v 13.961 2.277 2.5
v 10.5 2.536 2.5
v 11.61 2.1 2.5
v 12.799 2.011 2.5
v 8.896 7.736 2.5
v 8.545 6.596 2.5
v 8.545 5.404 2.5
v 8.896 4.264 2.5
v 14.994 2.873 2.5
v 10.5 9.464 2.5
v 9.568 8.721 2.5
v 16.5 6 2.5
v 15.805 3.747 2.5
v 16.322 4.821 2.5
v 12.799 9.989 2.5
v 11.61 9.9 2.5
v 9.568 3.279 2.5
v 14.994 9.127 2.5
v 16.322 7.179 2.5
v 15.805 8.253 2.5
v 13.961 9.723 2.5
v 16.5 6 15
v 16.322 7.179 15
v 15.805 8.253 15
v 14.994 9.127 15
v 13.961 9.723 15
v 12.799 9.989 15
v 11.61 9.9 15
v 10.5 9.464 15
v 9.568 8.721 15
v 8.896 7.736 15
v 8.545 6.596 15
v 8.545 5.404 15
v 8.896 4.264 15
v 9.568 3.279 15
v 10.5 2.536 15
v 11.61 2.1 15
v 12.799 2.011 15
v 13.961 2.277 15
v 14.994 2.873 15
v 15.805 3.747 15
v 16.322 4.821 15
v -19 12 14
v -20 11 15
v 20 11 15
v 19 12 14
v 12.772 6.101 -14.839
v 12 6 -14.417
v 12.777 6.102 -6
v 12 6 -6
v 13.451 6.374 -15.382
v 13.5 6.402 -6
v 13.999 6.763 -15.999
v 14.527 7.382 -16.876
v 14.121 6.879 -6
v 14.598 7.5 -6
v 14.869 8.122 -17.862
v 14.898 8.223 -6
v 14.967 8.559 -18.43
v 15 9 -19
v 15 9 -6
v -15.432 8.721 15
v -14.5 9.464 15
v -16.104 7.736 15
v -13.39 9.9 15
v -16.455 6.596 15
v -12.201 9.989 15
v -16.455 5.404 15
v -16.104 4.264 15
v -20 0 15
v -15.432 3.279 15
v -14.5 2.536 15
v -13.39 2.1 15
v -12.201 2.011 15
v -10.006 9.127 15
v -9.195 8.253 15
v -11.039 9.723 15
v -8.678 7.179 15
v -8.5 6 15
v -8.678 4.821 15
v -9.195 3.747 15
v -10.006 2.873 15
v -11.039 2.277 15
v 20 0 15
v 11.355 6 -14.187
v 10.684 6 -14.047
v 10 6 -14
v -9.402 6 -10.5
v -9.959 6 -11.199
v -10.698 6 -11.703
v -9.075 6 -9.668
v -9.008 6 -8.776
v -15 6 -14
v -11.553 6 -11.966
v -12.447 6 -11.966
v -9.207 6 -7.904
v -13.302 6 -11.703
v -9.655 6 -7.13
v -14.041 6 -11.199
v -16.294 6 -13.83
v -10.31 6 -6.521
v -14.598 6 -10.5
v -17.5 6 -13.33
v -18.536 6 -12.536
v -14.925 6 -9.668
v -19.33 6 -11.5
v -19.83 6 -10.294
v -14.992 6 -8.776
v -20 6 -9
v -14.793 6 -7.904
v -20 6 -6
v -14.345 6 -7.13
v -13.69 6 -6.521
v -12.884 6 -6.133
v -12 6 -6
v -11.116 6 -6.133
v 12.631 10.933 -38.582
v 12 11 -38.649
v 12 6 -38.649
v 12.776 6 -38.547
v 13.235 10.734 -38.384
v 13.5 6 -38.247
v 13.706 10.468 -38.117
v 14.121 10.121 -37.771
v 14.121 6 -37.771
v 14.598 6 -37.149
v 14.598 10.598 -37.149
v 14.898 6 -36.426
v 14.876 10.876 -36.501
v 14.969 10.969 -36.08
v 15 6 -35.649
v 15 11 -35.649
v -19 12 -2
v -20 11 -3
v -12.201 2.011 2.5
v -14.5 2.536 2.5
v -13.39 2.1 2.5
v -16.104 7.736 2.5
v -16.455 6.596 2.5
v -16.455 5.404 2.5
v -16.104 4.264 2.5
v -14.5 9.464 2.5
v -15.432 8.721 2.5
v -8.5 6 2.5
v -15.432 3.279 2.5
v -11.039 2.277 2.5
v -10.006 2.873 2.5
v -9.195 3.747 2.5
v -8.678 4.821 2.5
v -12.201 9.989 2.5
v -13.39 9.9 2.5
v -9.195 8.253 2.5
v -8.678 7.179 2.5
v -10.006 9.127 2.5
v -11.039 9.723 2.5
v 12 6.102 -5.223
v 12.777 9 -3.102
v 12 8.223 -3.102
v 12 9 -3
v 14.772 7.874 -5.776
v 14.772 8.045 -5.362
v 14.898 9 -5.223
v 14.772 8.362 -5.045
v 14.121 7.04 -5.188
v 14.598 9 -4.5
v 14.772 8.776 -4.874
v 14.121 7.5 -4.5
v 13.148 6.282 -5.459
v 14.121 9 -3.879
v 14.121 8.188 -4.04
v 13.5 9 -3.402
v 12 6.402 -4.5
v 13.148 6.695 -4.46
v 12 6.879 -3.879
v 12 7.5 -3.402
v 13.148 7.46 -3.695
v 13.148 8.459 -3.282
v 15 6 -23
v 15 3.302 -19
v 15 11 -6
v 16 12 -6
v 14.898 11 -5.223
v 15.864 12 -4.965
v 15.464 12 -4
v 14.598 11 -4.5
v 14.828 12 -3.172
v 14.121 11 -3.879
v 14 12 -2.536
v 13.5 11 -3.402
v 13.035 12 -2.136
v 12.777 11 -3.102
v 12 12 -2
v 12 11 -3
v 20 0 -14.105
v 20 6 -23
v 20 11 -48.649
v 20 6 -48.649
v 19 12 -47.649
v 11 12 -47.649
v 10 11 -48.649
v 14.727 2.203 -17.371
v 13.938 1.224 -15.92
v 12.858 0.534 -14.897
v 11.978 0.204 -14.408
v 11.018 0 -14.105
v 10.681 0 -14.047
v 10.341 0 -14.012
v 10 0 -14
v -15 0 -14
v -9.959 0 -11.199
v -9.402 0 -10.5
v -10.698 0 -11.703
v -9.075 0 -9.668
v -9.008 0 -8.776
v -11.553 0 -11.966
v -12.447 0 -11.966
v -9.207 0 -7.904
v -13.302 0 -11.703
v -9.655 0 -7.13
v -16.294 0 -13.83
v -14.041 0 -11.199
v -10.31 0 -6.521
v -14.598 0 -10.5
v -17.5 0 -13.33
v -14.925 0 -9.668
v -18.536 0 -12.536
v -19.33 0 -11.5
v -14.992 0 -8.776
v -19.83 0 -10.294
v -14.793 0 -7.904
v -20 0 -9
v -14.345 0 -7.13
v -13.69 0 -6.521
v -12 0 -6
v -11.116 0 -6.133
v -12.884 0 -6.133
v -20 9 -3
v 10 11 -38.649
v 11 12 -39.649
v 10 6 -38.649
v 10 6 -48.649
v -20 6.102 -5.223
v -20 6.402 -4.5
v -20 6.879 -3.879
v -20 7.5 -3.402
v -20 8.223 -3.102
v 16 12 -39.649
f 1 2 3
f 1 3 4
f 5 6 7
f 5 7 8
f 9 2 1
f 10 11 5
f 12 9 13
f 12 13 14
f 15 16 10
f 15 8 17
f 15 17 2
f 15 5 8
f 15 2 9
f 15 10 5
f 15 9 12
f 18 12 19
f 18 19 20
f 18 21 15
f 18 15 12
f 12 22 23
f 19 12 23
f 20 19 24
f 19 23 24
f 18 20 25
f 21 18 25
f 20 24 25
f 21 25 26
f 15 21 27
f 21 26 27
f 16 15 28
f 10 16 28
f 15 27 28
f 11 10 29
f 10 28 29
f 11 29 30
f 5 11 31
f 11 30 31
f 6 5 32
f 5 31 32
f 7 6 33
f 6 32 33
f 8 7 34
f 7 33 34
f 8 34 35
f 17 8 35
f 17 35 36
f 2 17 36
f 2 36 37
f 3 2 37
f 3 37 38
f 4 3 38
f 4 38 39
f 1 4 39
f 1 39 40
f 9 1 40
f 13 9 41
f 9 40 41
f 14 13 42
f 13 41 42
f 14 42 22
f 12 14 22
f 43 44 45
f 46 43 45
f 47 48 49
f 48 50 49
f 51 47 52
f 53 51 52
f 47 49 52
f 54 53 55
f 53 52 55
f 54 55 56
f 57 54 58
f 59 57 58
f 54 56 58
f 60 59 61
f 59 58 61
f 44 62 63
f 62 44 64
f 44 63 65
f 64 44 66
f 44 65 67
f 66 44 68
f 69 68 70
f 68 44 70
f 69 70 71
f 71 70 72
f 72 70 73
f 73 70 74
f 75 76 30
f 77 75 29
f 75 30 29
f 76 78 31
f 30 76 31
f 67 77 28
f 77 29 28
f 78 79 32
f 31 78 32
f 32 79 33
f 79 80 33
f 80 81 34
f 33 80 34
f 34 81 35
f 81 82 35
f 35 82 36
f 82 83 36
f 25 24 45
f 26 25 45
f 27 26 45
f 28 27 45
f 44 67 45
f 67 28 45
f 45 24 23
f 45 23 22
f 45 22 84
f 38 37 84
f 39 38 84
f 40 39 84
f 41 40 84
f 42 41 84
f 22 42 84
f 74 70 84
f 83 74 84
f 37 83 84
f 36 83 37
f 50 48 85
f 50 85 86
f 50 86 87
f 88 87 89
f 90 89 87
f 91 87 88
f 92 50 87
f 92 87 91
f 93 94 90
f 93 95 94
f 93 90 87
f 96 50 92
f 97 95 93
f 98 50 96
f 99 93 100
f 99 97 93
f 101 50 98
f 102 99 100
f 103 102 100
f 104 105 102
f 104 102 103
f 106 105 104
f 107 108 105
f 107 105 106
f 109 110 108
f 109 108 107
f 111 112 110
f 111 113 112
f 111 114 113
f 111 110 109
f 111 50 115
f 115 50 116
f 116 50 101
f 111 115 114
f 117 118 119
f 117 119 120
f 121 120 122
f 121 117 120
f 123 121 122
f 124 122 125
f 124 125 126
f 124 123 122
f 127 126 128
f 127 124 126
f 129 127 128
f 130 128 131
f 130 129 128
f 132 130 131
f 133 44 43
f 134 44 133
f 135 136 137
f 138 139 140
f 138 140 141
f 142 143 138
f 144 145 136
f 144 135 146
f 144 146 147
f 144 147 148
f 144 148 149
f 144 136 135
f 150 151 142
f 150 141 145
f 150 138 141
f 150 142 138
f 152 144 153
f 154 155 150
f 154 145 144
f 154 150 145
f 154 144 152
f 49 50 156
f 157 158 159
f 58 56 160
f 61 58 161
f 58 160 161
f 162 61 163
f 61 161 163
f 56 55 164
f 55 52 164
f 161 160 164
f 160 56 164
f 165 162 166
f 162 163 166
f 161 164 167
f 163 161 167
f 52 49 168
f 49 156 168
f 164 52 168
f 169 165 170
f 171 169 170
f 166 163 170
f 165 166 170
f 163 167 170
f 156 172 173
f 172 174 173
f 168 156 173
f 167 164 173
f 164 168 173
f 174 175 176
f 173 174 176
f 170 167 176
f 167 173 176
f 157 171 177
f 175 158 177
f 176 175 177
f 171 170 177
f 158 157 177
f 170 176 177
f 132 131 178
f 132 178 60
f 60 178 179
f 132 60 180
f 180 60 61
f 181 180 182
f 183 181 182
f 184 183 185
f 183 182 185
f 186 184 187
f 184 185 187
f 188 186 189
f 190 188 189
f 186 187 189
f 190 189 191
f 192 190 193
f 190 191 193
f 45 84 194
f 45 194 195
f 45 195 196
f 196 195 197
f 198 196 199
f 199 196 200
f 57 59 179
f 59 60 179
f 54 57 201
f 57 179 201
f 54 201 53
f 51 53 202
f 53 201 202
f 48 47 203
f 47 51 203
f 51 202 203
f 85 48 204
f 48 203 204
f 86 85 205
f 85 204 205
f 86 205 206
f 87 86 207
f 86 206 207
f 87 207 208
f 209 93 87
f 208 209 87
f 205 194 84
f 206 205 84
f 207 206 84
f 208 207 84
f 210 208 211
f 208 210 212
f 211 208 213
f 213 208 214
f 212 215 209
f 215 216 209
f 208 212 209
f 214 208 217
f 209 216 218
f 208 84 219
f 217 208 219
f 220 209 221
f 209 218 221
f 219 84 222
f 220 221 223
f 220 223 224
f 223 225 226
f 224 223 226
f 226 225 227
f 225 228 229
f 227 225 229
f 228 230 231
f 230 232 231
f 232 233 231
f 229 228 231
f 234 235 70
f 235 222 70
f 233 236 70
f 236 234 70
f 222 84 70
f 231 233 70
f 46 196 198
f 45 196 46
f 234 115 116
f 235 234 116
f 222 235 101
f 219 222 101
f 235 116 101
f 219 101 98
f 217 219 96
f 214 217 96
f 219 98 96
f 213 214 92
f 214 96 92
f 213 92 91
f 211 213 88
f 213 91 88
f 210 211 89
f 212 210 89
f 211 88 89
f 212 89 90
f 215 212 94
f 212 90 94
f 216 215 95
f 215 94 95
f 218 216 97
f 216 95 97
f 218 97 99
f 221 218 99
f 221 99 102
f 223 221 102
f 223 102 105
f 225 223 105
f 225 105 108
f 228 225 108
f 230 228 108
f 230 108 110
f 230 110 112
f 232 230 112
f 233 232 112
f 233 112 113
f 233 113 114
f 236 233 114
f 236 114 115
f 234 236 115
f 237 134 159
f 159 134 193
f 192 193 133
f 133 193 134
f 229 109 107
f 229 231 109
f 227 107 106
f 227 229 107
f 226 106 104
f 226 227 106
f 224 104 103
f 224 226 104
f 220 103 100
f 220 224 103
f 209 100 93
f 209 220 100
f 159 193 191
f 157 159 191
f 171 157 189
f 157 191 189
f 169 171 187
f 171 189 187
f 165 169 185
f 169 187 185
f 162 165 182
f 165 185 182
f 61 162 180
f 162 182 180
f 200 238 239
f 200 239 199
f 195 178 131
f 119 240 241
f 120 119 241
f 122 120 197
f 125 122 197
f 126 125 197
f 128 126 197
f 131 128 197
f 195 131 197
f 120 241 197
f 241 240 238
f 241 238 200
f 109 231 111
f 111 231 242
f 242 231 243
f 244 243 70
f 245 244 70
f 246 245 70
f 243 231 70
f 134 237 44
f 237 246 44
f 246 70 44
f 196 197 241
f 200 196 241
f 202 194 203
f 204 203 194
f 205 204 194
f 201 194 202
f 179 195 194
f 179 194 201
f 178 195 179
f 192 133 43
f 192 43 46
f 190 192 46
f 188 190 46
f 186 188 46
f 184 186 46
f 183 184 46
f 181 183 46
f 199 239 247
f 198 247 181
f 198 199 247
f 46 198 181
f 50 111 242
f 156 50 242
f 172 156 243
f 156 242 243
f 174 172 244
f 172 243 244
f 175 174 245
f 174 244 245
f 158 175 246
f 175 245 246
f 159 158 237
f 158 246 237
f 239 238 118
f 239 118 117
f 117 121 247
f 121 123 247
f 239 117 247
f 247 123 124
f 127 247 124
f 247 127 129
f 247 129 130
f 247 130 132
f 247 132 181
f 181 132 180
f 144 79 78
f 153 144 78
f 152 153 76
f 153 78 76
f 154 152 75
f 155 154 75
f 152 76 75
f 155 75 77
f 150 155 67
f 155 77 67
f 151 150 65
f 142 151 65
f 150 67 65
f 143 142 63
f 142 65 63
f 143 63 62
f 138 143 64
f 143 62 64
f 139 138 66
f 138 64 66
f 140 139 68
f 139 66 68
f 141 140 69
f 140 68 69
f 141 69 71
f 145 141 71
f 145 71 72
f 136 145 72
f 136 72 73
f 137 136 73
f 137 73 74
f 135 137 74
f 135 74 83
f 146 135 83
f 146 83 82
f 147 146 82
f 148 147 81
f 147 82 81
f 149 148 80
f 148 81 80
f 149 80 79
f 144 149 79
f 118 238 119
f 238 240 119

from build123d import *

# Parameters (mm, degrees)
SKETCH1_W           = 40
SKETCH1_H           = 30
BOSS_EXTRUDE1_DEPTH = 12
SKETCH2_W           = 25
SKETCH2_H           = 12
CUT_EXTRUDE1_DEPTH  = 12
SKETCH3_R           = 4
CUT_EXTRUDE2_DEPTH  = 100
FILLET1_R           = 5
SKETCH4_R           = 4
CUT_EXTRUDE3_DEPTH  = 12.5
SKETCH6_W           = 44.346855167
SKETCH6_H           = 29.153227126
CUT_EXTRUDE4_DEPTH  = 100
SKETCH7_W           = 40
SKETCH7_H           = 6
BOSS_EXTRUDE2_DEPTH = 20
SKETCH8_W           = 5
SKETCH8_H           = 20
SKETCH8_H_2         = 10
BOSS_EXTRUDE3_DEPTH = 6
SKETCH9_R           = 3
SKETCH9_W           = 35
SKETCH9_H           = 9
CUT_EXTRUDE5_DEPTH  = 20
CHAMFER2_SIZE2      = 6
CHAMFER2_SIZE       = 8.895365811
FILLET2_R           = 5
FILLET3_R           = 3
CHAMFER3_SIZE       = 1
FILLET4_R           = 3


with BuildPart() as part:
    # Sketch1 → Boss-Extrude1 (new body)
    with BuildSketch(Plane(origin=(0, 0, 0), x_dir=(1, 0, 0), z_dir=(0, 1, 0))):
        Rectangle(SKETCH1_W, SKETCH1_H)
    extrude(amount=BOSS_EXTRUDE1_DEPTH)

    # Sketch2 → Cut-Extrude1 (cut)
    with BuildSketch(Plane(origin=(0, 12, 0), x_dir=(1, 0, 0), z_dir=(0, 1, 0))):
        with Locations((0, 9)):
            Rectangle(SKETCH2_W, SKETCH2_H)
    extrude(amount=-CUT_EXTRUDE1_DEPTH, mode=Mode.SUBTRACT)

    # Sketch3 → Cut-Extrude2 (cut)
    with BuildSketch(Plane(origin=(20, 0, 0), x_dir=(0, 0, -1), z_dir=(1, 0, 0))):
        with Locations((9, 6)):
            Circle(SKETCH3_R)
    extrude(amount=-CUT_EXTRUDE2_DEPTH, mode=Mode.SUBTRACT)

    # Fillet1
    fillet1_edges = [part.edges().sort_by_distance(p)[0] for p in [
        (-16.25, 0, -15),
        (-16.25, 12, -15),
        (16.25, 0, -15),
        (16.25, 12, -15),
    ]]
    fillet(fillet1_edges, radius=FILLET1_R)

    # Sketch4 → Cut-Extrude3 (cut)
    with BuildSketch(Plane.XY.offset(15)):
        with Locations((-12.5, 6)):
            Circle(SKETCH4_R)
        with Locations((12.5, 6)):
            Circle(SKETCH4_R)
    extrude(amount=-CUT_EXTRUDE3_DEPTH, mode=Mode.SUBTRACT)

    # Sketch6 → Cut-Extrude4 (cut)
    with BuildSketch(Plane(origin=(0, 12, 0), x_dir=(1, 0, 0), z_dir=(0, 1, 0))):
        with Locations((2.173427584, 17.576613563)):
            Rectangle(SKETCH6_W, SKETCH6_H)
    extrude(amount=-CUT_EXTRUDE4_DEPTH, mode=Mode.SUBTRACT)

    # Sketch7 → Boss-Extrude2 (add)
    with BuildSketch(Plane(origin=(0, 0, -3), x_dir=(-1, 0, 0), z_dir=(0, 0, -1))):
        with Locations((0, 3)):
            Rectangle(SKETCH7_W, SKETCH7_H)
    extrude(amount=BOSS_EXTRUDE2_DEPTH)

    # Sketch8 → Boss-Extrude3 (add)
    with BuildSketch(Plane(origin=(0, 6, 0), x_dir=(1, 0, 0), z_dir=(0, 1, 0))):
        Polygon((15, 23), (20, 23), (20, 48.649342911), (15, 48.649342911), (15, 38.649342911), align=None)
        with Locations((17.5, 13)):
            Rectangle(SKETCH8_W, SKETCH8_H)
        with Locations((12.5, 43.649342911)):
            Rectangle(SKETCH8_W, SKETCH8_H_2)
    extrude(amount=BOSS_EXTRUDE3_DEPTH)

    # Sketch9 → Cut-Extrude5 (cut)
    with BuildSketch(Plane(origin=(0, 6, 0), x_dir=(1, 0, 0), z_dir=(0, 1, 0))):
        with Locations(Location((-12, 9, 0), (0, 0, 270))):
            Circle(SKETCH9_R)
        with Locations((-2.5, 18.5)):
            Rectangle(SKETCH9_W, SKETCH9_H)
    extrude(amount=-CUT_EXTRUDE5_DEPTH, mode=Mode.SUBTRACT)

    # Chamfer2
    chamfer2_edges = [part.edges().sort_by_distance(p)[0] for p in [
        (17.5, 0, -23),
    ]]
    chamfer2_side = [part.faces().sort_by_distance(p)[0] for p in [
        (17.5, 0, -22.88),
    ]]
    chamfer(chamfer2_edges, length=CHAMFER2_SIZE - 0.0001, length2=CHAMFER2_SIZE2 - 0.0001, reference=chamfer2_side[0])  # a hair under: the kernel refuses the full size

    # Fillet2
    fillet2_edges = [part.edges().sort_by_distance(p)[0] for p in [
        (-20, 3, -14),
        (15, 3, -14),
    ]]
    fillet(fillet2_edges, radius=FILLET2_R)

    # Fillet3
    fillet3_edges = [part.edges().sort_by_distance(p)[0] for p in [
        (-2.5, 6, -3),
        (15, 6, -11),
        (15, 9, -3),
    ]]
    fillet(fillet3_edges, radius=FILLET3_R - 0.0001)  # a hair under: the kernel refuses the full size

    # Chamfer3
    chamfer3_edges = [part.edges().sort_by_distance(p)[0] for p in [
        (15, 12, -48.649342911),
        (10, 12, -43.649342911),
        (15, 12, -22.324621456),
        (12.5, 12, -38.649342911),
        (0, 12, 15),
        (14.121349633, 12, -3.878650367),
        (-3.99995, 12, -3),
        (20, 12, -16.824671456),
        (-20, 12, 6),
    ]]
    chamfer(chamfer3_edges, length=CHAMFER3_SIZE)

    # Fillet4
    fillet4_edges = [part.edges().sort_by_distance(p)[0] for p in [
        (15, 8.5, -38.649342911),
    ]]
    fillet(fillet4_edges, radius=FILLET4_R)


solid = part.part
